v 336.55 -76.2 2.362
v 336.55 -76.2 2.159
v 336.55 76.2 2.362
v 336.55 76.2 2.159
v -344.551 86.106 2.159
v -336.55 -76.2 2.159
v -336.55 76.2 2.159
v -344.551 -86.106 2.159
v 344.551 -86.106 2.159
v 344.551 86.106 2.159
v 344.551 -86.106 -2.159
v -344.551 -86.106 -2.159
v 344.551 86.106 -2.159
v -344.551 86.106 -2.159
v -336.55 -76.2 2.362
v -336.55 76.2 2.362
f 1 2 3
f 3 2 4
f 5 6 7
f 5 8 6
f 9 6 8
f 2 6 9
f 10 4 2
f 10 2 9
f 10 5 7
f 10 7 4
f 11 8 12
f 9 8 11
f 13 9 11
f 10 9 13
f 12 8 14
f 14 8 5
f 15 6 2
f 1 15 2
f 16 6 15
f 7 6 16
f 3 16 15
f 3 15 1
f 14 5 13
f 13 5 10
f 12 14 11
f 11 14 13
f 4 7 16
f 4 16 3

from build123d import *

# Parameters (mm, degrees)
SKETCH1_W           = 689.102
SKETCH1_H           = 172.212
BOSS_EXTRUDE1_DEPTH = 2.159
SKETCH2_W           = 673.1
SKETCH2_H           = 152.4
BOSS_EXTRUDE2_DEPTH = 0.2032


with BuildPart() as part:
    # Sketch1 → Boss-Extrude1 (new body, symmetric)
    with BuildSketch(Plane.XY):
        Rectangle(SKETCH1_W, SKETCH1_H)
    extrude(amount=BOSS_EXTRUDE1_DEPTH, both=True)

    # Sketch2 → Boss-Extrude2 (add)
    with BuildSketch(Plane.XY.offset(2.159)):
        Rectangle(SKETCH2_W, SKETCH2_H)
    extrude(amount=BOSS_EXTRUDE2_DEPTH)


solid = part.part
